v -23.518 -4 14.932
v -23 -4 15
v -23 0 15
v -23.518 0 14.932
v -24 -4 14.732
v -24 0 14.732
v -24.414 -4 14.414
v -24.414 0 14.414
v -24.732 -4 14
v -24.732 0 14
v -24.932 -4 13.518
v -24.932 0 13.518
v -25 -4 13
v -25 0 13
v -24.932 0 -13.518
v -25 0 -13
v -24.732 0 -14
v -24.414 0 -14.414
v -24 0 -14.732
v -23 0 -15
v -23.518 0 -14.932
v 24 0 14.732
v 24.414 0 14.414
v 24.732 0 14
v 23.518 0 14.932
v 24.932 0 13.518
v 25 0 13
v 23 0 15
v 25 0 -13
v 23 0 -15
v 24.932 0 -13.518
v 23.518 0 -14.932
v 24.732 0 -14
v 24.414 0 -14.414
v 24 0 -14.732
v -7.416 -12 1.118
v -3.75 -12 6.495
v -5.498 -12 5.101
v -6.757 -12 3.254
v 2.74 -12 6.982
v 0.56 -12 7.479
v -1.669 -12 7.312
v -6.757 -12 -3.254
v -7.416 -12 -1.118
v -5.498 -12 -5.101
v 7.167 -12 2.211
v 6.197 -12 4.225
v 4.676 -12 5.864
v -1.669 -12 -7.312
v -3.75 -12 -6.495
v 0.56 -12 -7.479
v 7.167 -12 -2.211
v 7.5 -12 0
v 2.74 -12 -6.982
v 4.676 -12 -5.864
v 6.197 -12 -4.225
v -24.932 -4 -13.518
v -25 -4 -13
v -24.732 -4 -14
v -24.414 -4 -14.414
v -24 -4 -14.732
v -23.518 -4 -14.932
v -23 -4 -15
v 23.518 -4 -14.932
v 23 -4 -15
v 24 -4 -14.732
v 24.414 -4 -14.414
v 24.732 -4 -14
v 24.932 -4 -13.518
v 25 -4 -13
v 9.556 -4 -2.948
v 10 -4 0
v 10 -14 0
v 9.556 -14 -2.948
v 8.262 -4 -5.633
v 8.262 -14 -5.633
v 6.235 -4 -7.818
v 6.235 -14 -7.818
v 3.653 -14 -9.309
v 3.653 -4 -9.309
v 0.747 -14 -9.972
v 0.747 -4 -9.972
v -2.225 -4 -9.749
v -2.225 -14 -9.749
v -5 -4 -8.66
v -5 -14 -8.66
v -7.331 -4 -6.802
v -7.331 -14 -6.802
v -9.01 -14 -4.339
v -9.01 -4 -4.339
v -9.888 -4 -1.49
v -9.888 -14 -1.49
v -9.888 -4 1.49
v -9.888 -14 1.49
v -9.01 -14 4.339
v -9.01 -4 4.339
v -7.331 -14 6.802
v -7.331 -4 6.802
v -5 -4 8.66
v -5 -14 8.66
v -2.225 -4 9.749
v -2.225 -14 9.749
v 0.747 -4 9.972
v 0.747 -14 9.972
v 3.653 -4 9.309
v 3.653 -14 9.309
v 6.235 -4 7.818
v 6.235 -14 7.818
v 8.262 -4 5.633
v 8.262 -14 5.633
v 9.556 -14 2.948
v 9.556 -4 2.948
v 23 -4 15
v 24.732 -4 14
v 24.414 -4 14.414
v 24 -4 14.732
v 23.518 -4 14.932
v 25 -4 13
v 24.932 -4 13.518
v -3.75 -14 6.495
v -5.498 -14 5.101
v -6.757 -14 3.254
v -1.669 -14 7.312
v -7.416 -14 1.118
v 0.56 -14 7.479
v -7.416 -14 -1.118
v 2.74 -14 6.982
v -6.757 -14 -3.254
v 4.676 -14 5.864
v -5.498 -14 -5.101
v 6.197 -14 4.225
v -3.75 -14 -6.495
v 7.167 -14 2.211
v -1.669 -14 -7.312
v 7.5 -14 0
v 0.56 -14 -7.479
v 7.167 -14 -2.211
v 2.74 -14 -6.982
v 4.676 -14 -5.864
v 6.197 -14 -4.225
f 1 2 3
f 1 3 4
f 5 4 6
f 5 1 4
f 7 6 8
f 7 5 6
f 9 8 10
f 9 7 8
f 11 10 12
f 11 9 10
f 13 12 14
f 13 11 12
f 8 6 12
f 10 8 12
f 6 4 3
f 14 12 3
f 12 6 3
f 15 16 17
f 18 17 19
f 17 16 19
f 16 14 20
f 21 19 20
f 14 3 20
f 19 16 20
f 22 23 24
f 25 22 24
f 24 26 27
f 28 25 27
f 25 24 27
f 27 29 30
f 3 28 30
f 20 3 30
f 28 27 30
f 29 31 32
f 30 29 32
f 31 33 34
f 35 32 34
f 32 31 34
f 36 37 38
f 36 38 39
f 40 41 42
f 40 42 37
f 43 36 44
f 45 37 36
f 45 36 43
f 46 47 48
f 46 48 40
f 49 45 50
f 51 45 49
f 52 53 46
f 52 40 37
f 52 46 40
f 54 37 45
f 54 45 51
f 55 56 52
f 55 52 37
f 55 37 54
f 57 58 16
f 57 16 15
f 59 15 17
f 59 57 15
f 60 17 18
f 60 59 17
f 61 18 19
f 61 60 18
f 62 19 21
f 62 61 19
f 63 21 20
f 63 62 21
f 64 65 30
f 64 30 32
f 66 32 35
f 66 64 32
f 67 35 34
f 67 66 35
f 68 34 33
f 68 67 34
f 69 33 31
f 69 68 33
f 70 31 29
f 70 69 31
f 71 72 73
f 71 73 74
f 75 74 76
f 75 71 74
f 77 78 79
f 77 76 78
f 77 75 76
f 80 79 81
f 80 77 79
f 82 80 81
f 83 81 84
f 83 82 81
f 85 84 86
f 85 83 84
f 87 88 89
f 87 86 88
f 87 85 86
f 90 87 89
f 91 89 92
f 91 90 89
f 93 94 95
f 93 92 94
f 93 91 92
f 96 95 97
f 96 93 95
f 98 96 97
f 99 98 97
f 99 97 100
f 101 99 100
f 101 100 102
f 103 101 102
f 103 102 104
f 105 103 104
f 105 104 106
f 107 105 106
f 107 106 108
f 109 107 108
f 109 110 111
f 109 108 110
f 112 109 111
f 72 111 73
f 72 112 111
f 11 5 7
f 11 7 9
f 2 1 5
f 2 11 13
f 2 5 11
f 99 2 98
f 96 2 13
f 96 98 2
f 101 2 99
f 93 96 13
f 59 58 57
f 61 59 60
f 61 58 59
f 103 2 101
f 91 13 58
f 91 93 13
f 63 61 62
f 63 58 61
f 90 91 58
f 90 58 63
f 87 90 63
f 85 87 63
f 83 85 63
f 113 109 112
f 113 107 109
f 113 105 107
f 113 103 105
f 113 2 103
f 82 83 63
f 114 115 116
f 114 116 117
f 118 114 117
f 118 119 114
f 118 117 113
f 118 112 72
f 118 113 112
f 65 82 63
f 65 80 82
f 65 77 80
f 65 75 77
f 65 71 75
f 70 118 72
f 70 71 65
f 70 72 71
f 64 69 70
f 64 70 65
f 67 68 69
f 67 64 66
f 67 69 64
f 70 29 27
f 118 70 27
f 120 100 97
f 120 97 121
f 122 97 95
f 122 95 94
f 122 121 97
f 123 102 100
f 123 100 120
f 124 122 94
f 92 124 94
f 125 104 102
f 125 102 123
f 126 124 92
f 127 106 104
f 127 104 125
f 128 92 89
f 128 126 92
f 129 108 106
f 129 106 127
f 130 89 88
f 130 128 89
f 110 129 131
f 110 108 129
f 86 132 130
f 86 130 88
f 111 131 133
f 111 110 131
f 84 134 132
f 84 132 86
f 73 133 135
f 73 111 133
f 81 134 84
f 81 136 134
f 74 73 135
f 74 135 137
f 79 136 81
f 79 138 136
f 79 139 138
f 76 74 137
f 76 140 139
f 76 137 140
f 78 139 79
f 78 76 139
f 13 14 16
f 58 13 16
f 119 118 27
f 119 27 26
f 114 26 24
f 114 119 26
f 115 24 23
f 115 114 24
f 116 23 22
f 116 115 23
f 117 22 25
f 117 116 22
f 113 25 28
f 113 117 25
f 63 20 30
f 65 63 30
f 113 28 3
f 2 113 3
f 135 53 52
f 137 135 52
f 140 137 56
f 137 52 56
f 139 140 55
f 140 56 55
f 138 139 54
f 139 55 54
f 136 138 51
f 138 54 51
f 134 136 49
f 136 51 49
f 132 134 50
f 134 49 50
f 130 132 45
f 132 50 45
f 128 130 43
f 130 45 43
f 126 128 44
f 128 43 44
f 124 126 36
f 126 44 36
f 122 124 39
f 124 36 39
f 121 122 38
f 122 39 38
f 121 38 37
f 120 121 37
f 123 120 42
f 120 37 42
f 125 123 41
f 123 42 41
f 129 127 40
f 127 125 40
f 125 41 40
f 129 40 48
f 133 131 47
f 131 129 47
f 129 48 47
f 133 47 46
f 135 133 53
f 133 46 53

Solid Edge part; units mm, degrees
sketch "Sketch1" plane through (0, 0, 0) normal (0, -1, 0) x (1, 0, 0)
  line L0 (25, -15) -> (25, 15)
  line L1 (25, 15) -> (-25, 15)
  line L2 (-25, 15) -> (-25, -15)
  line L3 (-25, -15) -> (25, -15)
extrude "Protrusion1" add sketch "Sketch1" along normal blind 4
sketch "Sketch2" plane through (0, -4, 0) normal (0, -1, 0) x (1, 0, 0)
  circle A0 centre (0, 0) radius 7.5
extrude "ExtrudedProtrusion_2" add sketch "Sketch2" along normal blind 8
sketch "Sketch3" plane through (0, -4, 0) normal (0, -1, 0) x (1, 0, 0)
  circle A0 centre (0, 0) radius 10
  circle A1 centre (0, 0) radius 7.5
  dimension "D1" = 20
  dimension "D2" = 15
extrude "ExtrudedProtrusion_3" add sketch "Sketch3" along normal blind 10
fillet "Round_1" radius 2 4 edges at (25, -2, 15) (25, -2, -15) (-25, -2, -15) (-25, -2, 15)
